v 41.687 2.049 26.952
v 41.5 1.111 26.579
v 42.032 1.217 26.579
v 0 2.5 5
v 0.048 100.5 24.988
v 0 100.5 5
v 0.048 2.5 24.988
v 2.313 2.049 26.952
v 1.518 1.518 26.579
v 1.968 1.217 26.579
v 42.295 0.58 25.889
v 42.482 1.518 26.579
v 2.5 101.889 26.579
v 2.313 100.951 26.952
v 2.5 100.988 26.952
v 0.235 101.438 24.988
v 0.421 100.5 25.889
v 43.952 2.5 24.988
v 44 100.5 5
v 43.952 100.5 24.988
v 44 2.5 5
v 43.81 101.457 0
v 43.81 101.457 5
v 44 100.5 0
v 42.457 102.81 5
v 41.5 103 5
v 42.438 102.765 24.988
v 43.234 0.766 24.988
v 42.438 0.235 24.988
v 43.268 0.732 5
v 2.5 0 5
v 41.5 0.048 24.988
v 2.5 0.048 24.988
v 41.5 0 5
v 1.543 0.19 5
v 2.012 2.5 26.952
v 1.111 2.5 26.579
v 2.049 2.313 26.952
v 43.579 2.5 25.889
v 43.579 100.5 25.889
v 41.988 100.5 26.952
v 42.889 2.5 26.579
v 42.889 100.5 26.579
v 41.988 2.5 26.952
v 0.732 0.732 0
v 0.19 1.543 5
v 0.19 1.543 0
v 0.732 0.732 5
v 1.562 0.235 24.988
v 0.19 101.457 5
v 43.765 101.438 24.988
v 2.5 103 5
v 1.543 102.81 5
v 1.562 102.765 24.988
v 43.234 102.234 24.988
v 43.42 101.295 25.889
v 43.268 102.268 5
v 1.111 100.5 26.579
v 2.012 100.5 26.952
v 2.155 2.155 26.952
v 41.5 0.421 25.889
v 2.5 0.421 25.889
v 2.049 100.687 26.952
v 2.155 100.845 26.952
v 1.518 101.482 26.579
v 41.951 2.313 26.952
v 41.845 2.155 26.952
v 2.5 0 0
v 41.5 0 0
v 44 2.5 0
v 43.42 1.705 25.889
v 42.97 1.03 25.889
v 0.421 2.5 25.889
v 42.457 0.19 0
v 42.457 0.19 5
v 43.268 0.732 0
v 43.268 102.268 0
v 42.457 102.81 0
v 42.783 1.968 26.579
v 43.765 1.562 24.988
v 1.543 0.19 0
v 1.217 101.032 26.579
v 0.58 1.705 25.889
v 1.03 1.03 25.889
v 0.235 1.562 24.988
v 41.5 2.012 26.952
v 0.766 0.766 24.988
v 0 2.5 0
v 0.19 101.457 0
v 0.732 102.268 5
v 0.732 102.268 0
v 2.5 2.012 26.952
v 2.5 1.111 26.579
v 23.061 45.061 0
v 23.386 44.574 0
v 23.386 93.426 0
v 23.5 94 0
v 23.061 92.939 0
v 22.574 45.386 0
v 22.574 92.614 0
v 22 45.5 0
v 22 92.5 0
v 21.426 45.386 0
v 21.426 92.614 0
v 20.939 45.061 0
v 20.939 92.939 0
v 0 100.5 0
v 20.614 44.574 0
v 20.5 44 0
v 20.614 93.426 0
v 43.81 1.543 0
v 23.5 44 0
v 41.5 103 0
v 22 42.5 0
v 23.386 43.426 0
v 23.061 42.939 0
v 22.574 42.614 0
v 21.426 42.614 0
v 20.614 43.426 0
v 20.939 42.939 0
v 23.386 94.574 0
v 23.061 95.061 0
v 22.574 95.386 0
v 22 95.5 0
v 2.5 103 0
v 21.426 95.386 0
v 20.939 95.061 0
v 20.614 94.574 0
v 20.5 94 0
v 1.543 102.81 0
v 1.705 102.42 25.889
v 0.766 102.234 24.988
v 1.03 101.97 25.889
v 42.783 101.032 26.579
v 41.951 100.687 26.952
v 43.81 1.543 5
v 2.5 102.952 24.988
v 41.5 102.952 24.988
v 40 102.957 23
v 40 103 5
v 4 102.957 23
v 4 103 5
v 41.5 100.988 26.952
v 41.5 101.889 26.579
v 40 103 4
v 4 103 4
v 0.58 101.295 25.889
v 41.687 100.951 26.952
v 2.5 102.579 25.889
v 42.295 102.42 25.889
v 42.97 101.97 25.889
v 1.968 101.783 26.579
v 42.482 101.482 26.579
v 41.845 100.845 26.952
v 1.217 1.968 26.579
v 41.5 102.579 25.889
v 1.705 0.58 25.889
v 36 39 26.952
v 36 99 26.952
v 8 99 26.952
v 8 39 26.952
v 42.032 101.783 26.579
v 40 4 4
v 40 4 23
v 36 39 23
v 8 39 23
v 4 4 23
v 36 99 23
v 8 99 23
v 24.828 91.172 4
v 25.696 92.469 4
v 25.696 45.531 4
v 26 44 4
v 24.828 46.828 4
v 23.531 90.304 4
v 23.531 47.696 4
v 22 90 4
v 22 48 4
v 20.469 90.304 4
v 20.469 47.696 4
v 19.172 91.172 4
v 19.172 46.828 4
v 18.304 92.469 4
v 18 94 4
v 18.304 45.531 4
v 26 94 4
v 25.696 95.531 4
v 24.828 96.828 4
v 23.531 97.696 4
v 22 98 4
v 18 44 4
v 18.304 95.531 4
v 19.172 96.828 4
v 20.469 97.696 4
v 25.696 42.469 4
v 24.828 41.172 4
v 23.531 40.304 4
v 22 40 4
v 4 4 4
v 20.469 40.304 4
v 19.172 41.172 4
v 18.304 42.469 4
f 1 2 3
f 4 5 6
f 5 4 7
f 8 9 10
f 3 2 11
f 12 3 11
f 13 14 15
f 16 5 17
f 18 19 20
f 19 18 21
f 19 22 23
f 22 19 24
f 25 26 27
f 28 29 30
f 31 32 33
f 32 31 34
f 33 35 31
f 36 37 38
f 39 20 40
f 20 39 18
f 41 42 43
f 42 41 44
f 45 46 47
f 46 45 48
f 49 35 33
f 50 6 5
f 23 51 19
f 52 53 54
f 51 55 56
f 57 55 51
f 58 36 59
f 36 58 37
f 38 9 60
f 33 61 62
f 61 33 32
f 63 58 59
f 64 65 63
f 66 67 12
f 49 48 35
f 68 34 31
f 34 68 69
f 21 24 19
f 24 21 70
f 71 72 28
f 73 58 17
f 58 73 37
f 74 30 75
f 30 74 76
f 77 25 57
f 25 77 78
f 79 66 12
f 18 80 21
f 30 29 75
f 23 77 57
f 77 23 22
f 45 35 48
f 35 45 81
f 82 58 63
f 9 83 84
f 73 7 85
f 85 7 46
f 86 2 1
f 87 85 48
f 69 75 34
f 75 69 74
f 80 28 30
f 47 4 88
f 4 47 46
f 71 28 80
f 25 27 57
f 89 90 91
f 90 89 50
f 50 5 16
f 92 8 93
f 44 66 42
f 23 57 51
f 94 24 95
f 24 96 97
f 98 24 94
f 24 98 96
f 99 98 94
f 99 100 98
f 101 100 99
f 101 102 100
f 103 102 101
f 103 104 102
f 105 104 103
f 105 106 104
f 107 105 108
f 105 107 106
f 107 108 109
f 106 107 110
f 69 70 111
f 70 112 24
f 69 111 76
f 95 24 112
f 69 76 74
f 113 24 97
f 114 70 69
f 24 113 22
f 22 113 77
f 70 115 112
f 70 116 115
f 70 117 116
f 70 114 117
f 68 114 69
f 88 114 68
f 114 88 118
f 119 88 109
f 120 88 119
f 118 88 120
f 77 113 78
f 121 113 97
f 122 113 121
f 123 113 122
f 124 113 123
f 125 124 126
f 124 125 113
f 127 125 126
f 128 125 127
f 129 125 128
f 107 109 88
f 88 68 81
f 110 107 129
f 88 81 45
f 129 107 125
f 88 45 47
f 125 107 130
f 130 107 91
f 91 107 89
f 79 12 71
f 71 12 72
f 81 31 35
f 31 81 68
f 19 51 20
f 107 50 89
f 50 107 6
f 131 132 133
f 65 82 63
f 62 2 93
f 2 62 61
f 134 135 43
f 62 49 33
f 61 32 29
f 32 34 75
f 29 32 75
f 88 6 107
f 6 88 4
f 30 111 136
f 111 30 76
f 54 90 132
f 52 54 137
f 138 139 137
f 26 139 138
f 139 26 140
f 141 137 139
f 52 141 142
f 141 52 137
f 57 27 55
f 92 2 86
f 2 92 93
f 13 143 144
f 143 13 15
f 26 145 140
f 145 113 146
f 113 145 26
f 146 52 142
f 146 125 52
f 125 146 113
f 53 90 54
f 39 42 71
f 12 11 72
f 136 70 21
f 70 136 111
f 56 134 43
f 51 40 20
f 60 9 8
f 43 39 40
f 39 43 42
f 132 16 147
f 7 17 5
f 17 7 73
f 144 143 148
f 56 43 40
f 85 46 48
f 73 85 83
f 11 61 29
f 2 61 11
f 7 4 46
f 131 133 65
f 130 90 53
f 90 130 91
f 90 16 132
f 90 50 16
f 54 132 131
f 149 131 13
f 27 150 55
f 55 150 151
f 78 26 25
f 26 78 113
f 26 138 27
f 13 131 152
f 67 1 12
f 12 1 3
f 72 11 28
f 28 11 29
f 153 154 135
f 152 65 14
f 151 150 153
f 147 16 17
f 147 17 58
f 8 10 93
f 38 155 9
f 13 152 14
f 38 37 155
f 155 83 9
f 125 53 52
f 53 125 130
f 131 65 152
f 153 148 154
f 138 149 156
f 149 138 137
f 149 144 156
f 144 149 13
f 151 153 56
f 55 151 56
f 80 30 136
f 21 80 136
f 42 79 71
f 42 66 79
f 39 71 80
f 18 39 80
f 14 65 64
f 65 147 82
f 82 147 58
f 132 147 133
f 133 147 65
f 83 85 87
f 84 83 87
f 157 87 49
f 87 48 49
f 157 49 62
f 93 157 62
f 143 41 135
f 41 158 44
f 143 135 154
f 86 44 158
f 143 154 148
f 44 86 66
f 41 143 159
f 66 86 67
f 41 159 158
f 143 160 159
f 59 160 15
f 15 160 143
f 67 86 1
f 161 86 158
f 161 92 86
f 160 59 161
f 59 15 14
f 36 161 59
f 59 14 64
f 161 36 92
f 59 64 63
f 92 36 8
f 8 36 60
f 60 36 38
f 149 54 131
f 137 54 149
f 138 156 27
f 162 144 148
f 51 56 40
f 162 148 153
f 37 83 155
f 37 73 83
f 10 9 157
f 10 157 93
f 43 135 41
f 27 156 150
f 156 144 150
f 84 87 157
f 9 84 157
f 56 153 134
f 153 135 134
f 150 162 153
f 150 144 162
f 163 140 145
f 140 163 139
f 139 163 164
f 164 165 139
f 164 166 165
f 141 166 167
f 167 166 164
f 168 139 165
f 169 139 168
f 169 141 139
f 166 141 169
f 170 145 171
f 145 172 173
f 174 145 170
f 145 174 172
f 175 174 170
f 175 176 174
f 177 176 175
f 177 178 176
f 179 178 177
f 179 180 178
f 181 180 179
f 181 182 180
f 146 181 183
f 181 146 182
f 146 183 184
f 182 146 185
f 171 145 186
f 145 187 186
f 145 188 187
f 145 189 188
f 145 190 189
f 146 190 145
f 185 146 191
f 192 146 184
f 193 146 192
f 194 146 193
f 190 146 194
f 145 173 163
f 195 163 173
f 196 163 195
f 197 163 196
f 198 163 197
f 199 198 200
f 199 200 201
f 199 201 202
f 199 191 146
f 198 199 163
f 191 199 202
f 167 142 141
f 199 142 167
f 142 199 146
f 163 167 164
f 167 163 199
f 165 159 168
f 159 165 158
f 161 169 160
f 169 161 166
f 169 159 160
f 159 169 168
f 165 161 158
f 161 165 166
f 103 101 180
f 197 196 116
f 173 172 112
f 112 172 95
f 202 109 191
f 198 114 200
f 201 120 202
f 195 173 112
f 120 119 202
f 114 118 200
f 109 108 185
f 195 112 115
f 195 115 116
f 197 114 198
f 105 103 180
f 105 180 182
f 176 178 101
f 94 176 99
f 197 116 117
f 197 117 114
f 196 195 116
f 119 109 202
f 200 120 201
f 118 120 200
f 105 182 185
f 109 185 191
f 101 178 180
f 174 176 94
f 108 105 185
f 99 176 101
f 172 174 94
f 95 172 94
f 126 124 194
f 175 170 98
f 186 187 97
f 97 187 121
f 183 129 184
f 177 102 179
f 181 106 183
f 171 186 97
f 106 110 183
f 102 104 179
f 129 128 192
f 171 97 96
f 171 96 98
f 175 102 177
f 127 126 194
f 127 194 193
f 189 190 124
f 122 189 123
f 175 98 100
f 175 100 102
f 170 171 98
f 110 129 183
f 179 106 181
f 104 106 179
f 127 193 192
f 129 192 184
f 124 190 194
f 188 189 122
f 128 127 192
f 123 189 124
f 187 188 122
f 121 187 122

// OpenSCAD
// file: CubeModuleWithRoundTopEdges.scad
module CubeModuleWithRoundTopEdges(width, depth, height, sphereRadius){
  hull(){
    for(x=[sphereRadius, width]){
      for(y=[sphereRadius, depth]){
        translate([x-sphereRadius/2,y-sphereRadius/2,0])cylinder(h=sphereRadius, d=sphereRadius);
        translate([x-sphereRadius/2,y-sphereRadius/2,height-sphereRadius/2])sphere(d=sphereRadius);
      }
    }
  }
}
// main file
include <CubeModuleWithRoundTopEdges.scad>
width=36;
depth=19;

wallThickness=4;
windowHeight=60;
windowWidth=width-8;
windowDepth=wallThickness;
windowHeightOffset=35;

height=windowHeight+windowHeightOffset+wallThickness;

edgeRounding=5;

screwDiameterHead=8;
screwDiameterShank=3;
screwClearance=1;

$fn=16;
difference(){
  CubeModuleWithRoundTopEdges(width+2*wallThickness, height+wallThickness, depth+2*wallThickness, edgeRounding);
  
  translate([wallThickness, wallThickness, wallThickness])cube([ width, height, depth]);
  
  //Window
  translate([ (wallThickness*2+width-windowWidth)/2, windowHeightOffset+wallThickness,depth+wallThickness])cube([windowWidth, windowHeight, windowDepth]);
  
  //Screw holes
  translate([(width+2*wallThickness)/2, windowHeightOffset+screwDiameterHead/2+wallThickness+screwClearance, 0])cylinder(wallThickness, d1=screwDiameterShank, d2=screwDiameterHead);
  
  translate([(width+2*wallThickness)/2, windowHeightOffset+windowHeight+wallThickness-screwDiameterHead/2-screwClearance, 0])cylinder(wallThickness, d1=screwDiameterShank, d2=screwDiameterHead);
}
